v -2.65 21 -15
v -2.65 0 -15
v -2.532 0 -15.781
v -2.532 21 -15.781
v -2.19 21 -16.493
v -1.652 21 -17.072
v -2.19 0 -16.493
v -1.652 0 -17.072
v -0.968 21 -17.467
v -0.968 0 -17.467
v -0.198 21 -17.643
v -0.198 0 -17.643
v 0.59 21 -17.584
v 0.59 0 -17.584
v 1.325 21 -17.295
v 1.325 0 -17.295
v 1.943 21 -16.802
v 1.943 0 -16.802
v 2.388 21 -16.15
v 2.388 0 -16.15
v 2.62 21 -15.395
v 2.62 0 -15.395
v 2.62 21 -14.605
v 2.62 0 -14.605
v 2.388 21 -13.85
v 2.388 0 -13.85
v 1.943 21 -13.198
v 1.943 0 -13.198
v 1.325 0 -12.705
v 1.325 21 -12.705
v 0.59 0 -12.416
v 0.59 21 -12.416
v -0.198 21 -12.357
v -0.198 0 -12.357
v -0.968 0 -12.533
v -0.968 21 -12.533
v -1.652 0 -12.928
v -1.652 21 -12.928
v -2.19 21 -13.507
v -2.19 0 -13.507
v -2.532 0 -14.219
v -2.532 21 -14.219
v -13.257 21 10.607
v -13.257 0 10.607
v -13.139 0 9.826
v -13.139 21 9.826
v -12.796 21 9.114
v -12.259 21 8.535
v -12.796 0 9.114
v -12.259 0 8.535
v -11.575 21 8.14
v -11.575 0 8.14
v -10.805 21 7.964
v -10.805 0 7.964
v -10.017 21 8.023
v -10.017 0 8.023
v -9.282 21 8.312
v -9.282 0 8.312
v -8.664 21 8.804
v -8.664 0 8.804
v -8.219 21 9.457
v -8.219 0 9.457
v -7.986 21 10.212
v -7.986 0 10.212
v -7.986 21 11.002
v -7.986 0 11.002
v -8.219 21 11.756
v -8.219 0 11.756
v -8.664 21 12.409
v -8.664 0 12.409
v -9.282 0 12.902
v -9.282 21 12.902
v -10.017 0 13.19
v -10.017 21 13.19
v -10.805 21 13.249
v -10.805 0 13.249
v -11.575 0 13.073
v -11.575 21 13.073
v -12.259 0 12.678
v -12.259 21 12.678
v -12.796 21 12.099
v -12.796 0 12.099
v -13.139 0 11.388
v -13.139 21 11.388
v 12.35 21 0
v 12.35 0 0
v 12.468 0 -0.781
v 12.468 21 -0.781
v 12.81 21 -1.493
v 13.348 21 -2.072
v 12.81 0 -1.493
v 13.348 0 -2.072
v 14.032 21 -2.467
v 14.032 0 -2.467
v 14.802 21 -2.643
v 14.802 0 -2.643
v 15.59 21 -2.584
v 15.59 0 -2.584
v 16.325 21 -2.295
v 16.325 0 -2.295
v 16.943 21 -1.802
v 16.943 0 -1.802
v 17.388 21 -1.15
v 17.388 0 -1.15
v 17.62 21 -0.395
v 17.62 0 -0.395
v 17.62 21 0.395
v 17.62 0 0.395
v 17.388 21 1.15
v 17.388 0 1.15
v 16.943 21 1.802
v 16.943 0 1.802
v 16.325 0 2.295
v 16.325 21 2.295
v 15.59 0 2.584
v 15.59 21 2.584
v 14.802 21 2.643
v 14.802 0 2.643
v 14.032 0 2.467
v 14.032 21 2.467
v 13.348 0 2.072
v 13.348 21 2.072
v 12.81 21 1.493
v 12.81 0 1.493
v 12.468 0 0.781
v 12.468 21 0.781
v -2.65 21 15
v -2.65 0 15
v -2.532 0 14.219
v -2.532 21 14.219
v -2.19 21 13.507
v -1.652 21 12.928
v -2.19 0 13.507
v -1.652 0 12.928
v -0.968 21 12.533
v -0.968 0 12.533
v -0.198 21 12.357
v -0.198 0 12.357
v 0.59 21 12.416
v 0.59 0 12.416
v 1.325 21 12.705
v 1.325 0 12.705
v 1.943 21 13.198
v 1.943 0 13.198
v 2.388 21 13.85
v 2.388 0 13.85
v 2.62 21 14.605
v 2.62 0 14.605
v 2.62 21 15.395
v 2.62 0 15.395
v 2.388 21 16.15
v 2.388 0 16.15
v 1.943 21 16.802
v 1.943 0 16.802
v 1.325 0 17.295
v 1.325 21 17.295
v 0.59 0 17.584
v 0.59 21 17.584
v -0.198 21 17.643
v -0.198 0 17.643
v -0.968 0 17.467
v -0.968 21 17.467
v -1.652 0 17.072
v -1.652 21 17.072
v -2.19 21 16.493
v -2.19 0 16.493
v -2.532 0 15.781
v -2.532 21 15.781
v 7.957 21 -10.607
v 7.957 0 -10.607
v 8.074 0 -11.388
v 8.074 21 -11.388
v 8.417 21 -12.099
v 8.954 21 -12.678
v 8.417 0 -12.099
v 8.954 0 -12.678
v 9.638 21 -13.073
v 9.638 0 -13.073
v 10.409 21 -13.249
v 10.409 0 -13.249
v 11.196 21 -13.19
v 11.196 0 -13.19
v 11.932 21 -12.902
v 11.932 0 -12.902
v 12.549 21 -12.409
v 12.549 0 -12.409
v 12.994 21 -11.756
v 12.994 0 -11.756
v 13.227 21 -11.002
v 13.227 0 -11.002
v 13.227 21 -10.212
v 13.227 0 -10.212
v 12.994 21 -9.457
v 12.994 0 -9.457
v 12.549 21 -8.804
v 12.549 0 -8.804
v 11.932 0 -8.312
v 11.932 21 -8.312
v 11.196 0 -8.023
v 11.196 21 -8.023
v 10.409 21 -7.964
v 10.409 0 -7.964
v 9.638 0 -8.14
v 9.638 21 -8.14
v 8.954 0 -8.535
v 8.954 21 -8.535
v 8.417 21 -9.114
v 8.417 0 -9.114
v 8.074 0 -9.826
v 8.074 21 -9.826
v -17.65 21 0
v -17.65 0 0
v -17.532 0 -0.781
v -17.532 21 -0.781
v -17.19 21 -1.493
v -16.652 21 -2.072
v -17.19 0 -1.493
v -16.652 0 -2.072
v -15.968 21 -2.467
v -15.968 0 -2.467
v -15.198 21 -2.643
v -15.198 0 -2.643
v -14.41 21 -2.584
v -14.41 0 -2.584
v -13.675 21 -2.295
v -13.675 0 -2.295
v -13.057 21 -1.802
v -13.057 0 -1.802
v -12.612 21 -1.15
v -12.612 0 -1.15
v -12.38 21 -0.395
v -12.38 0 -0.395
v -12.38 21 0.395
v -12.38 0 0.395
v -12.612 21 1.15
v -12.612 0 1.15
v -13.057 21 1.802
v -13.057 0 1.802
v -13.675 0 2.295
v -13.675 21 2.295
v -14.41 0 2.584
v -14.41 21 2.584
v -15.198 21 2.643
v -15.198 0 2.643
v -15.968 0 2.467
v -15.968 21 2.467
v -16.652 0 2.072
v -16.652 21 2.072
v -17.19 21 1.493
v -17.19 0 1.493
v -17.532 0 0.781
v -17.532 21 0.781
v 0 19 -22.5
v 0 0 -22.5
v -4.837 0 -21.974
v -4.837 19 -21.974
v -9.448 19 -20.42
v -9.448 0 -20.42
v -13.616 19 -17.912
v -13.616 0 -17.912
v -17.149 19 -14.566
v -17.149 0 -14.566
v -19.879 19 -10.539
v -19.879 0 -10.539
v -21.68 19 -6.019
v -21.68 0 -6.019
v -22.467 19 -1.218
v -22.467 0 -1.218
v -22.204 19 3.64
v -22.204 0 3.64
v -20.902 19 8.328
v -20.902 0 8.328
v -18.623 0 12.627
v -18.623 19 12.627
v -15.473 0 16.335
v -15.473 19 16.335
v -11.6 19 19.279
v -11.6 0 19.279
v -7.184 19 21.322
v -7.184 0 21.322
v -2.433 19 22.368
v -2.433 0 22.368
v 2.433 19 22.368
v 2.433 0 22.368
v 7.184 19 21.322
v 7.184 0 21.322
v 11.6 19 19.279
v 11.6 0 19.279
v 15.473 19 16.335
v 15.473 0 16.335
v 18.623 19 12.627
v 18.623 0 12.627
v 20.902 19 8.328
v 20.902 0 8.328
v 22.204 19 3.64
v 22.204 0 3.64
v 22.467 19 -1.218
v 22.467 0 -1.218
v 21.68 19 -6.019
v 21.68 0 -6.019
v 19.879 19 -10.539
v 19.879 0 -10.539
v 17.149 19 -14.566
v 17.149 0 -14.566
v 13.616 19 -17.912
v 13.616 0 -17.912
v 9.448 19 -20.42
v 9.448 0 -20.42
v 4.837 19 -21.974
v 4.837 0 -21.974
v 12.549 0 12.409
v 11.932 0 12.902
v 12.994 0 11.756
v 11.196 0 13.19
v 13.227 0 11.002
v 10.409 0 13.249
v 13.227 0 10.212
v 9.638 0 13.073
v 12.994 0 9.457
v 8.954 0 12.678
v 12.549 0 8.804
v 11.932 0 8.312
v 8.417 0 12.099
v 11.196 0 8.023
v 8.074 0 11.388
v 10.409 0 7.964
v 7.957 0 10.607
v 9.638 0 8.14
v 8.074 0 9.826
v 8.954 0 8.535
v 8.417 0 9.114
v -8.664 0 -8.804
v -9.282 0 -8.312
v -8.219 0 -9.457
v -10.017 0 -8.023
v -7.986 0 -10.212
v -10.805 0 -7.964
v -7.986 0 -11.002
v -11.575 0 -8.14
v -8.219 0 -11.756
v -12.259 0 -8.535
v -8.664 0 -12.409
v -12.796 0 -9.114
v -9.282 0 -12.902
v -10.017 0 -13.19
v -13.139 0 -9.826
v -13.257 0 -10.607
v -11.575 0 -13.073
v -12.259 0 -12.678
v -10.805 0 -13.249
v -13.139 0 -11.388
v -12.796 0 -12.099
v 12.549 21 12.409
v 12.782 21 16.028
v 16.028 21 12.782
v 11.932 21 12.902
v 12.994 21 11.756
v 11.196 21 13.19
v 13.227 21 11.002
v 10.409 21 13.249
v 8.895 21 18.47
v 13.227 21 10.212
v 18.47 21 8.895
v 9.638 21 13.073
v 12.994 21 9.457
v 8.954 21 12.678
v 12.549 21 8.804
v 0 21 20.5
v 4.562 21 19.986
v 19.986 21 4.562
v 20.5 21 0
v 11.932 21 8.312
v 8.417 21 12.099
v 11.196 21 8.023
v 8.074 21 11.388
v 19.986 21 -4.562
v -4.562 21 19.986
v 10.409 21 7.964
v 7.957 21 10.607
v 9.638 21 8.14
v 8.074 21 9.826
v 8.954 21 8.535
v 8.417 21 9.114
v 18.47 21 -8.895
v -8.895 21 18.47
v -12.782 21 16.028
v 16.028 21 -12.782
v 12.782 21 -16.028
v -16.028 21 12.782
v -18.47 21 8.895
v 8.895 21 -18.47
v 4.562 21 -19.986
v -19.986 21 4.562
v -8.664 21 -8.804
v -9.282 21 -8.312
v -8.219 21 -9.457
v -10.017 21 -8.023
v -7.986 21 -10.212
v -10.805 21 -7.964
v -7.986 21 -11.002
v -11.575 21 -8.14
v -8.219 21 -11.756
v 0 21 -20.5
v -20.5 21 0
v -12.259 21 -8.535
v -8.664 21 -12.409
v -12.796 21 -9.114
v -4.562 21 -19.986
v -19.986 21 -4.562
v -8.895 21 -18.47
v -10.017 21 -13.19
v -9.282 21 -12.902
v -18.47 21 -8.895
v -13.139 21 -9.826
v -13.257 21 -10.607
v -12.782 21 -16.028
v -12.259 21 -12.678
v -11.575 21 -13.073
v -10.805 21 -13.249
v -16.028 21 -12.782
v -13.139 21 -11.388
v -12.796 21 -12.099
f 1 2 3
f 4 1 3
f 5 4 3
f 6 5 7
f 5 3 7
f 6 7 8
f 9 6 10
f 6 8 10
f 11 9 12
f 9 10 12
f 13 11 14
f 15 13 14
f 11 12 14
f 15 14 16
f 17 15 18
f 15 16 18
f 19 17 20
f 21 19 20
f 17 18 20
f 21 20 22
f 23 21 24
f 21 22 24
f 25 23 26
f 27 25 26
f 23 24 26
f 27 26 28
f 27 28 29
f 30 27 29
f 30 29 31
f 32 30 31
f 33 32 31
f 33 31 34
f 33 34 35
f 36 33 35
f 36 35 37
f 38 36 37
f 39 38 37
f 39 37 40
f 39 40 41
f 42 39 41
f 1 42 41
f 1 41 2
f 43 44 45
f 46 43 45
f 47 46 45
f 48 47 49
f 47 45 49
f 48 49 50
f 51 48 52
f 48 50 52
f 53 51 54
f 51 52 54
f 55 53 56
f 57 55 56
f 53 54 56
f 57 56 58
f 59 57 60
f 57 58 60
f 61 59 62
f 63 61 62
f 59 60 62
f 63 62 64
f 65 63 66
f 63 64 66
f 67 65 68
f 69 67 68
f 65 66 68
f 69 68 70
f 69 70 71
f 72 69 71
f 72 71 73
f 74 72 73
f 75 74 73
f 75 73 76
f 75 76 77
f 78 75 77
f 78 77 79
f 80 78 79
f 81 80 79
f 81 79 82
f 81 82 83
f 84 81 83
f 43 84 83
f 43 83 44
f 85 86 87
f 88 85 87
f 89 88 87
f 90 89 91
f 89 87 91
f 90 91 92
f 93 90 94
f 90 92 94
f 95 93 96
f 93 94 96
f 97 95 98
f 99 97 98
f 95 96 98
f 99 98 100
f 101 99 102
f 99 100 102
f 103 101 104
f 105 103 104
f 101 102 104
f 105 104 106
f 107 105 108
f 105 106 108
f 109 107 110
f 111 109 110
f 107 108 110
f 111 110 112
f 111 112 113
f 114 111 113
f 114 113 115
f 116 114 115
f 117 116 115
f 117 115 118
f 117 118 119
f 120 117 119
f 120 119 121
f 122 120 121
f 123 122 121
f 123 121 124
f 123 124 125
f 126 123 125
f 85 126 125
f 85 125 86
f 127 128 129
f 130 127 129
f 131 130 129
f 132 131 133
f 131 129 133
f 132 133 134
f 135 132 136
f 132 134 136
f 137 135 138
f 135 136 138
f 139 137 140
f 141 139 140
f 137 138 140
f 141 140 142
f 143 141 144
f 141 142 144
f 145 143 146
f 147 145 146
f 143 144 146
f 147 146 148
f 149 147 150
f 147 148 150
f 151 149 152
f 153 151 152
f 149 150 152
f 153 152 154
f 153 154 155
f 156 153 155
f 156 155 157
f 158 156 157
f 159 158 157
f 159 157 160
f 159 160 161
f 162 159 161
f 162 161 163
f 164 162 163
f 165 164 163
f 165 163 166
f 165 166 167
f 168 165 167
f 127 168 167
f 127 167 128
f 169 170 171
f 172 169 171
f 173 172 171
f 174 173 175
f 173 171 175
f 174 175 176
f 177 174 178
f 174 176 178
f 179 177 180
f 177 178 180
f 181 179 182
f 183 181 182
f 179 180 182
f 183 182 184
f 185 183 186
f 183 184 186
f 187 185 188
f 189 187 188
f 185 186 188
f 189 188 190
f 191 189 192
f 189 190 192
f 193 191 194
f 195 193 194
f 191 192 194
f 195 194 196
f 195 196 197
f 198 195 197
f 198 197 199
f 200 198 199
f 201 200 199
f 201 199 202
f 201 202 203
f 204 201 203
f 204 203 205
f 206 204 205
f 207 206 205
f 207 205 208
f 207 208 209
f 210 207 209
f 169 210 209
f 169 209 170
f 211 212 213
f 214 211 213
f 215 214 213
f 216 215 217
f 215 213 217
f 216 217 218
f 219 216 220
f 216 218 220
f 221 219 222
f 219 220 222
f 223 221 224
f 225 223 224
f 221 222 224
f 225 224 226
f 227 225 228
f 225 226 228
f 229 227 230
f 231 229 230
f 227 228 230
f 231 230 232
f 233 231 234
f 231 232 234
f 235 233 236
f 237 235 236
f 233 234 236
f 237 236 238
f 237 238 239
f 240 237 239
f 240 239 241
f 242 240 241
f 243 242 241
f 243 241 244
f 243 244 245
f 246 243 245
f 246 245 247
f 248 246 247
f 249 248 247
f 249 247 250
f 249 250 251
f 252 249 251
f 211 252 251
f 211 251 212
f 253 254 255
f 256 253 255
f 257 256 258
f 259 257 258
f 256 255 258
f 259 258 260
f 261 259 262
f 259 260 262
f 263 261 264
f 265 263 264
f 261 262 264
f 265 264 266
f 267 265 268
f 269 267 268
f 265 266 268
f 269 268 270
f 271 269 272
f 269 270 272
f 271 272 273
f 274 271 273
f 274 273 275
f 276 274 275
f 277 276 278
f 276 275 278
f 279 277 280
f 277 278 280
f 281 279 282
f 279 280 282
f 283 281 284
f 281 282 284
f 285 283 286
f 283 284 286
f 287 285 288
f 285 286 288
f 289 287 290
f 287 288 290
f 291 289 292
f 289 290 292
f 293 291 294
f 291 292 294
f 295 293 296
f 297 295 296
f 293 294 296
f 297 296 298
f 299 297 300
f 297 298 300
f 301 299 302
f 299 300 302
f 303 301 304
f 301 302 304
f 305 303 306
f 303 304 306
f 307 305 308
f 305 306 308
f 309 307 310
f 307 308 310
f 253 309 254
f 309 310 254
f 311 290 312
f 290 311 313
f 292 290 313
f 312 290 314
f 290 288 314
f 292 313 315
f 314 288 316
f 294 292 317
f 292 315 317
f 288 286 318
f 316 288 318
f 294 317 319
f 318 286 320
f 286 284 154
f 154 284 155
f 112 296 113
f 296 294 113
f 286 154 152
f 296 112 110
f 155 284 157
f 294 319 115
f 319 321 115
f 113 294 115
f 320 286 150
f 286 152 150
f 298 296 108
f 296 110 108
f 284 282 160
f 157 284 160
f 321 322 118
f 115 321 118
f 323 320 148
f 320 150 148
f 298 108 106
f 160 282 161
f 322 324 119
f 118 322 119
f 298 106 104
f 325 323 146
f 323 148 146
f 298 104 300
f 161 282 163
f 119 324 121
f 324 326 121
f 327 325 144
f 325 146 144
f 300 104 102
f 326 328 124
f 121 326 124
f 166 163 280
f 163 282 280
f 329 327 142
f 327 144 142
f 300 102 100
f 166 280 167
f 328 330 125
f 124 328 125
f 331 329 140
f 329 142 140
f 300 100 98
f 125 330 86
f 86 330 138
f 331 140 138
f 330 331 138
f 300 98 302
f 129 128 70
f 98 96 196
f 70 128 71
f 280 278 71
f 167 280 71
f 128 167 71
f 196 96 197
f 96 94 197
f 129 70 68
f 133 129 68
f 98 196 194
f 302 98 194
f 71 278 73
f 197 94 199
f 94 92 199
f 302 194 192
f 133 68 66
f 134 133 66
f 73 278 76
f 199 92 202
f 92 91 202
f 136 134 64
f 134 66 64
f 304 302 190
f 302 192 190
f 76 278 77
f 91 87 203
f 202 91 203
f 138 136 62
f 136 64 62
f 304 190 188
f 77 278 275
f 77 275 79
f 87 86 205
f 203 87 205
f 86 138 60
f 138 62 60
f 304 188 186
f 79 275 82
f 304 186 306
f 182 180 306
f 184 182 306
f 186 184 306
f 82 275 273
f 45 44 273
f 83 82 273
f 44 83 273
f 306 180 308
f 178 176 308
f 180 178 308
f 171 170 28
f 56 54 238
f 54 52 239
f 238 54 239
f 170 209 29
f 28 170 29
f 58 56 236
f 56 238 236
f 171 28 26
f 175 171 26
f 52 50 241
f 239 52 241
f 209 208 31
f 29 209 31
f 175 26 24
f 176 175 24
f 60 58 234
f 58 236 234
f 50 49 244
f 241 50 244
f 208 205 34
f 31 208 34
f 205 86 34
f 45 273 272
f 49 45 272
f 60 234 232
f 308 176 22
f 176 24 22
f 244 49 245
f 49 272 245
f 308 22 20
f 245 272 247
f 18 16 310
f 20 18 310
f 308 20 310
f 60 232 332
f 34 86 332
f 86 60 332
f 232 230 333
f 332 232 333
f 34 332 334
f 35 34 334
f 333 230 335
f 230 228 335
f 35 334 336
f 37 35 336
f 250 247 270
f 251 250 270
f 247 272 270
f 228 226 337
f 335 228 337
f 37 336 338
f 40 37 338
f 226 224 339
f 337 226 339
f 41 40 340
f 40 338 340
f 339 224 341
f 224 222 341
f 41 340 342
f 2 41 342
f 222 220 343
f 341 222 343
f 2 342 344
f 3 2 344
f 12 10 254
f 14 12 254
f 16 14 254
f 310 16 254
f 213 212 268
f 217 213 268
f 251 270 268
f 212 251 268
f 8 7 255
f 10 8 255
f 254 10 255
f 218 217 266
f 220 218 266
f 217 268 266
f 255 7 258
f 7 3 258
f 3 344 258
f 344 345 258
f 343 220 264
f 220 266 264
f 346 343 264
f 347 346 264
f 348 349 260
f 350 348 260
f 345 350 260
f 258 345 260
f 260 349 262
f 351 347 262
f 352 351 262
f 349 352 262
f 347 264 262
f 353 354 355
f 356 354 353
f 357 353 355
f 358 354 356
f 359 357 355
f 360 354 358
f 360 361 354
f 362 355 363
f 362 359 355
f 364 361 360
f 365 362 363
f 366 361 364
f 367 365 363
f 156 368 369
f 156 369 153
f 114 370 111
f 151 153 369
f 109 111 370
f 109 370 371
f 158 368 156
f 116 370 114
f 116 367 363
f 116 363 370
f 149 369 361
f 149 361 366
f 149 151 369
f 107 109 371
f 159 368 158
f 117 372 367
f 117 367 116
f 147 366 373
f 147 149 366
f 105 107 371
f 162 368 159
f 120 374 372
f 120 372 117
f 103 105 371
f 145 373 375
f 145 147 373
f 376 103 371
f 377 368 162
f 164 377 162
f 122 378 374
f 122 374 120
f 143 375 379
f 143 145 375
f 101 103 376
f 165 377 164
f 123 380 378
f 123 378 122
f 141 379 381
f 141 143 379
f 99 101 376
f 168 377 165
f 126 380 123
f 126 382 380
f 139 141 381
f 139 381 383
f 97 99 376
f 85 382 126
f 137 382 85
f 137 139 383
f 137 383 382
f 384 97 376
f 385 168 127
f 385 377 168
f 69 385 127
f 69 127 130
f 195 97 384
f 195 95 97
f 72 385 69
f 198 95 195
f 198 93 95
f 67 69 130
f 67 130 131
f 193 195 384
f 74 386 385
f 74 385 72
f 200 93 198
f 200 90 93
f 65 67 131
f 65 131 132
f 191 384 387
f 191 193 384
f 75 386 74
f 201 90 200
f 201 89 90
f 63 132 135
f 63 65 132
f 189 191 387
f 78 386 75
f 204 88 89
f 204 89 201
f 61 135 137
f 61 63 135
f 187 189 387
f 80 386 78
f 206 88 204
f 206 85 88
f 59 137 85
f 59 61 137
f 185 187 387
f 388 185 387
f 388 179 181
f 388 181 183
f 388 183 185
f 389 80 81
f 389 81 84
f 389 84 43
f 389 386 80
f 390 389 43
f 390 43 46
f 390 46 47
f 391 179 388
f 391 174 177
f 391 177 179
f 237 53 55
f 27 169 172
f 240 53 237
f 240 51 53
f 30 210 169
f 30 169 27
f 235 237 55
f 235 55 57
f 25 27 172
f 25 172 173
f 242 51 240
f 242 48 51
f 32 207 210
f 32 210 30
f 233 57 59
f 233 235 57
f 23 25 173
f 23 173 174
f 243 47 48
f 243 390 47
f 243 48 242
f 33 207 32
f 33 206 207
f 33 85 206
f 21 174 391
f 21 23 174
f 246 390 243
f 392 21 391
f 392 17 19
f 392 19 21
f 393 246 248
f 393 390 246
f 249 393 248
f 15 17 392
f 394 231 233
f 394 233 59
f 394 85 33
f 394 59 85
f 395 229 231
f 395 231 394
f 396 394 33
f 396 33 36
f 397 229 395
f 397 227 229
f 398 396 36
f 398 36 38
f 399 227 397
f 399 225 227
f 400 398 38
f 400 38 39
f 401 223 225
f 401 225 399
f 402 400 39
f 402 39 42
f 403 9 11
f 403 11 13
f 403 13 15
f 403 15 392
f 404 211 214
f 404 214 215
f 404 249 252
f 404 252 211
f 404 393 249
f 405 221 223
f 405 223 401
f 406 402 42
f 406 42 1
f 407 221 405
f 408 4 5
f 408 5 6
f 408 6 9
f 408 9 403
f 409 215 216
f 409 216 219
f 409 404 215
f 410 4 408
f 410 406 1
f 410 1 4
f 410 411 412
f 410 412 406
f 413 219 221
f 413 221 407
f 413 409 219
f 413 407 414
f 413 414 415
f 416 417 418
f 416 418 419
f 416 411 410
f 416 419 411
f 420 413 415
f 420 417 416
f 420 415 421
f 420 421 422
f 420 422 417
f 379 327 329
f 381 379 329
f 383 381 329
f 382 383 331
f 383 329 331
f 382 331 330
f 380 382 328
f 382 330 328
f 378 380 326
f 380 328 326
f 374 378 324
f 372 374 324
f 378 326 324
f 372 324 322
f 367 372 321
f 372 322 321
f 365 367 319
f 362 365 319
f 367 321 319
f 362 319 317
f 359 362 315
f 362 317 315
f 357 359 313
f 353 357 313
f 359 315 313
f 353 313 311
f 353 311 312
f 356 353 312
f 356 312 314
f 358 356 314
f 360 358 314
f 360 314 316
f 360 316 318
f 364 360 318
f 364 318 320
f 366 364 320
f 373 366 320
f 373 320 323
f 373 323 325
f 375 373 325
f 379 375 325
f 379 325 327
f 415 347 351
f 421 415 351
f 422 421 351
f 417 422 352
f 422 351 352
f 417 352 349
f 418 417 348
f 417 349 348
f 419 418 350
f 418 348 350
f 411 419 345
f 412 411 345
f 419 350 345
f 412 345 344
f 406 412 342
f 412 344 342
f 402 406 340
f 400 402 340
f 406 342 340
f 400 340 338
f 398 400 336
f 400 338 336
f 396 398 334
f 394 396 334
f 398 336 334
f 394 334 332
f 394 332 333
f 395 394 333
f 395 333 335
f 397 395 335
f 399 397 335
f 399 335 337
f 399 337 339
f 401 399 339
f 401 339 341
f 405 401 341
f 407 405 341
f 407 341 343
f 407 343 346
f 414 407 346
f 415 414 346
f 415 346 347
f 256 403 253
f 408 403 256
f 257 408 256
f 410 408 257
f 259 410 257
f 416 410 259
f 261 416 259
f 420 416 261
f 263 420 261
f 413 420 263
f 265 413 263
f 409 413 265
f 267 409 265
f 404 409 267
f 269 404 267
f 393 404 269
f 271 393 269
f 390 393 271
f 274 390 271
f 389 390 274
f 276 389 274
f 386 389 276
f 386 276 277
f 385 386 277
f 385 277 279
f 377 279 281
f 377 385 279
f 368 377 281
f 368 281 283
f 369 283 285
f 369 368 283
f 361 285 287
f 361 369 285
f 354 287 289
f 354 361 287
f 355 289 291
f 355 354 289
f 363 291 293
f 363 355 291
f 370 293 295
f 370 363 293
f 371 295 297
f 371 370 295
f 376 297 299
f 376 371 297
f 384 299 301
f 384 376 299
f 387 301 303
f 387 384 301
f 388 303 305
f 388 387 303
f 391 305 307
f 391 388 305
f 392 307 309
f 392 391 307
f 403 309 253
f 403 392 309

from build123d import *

# Parameters (mm, degrees)
SKETCH1_R            = 22.5
BOSS_EXTRUDE1_DEPTH  = 21
CHAMFER1_SIZE        = 2
M5_CLEARANCE_HOLE1_D = 5.3


with BuildPart() as part:
    # Sketch1 → Boss-Extrude1 (new body)
    with BuildSketch(Plane(origin=(0, 0, 0), x_dir=(1, 0, 0), z_dir=(0, 1, 0))):
        with Locations(Location((0, 0, 0), (0, 0, 90))):
            Circle(SKETCH1_R)
    extrude(amount=BOSS_EXTRUDE1_DEPTH)

    # Chamfer1
    chamfer1_edges = [part.edges().sort_by_distance(p)[0] for p in [
        (0, 21, 22.5),
    ]]
    chamfer(chamfer1_edges, length=CHAMFER1_SIZE)

    # M5 Clearance Hole1 (through all)
    with Locations(Plane(origin=(0, 21, 0), x_dir=(1, 0, 0), z_dir=(0, 1, 0))):
        with Locations((-10.606601718, 10.606601718), (0, 15), (15, 0), (0, -15), (-15, 0), (10.606601718, 10.606601718), (10.606601718, -10.606601718), (-10.606601718, -10.606601718)):
            Hole(M5_CLEARANCE_HOLE1_D / 2)


solid = part.part
